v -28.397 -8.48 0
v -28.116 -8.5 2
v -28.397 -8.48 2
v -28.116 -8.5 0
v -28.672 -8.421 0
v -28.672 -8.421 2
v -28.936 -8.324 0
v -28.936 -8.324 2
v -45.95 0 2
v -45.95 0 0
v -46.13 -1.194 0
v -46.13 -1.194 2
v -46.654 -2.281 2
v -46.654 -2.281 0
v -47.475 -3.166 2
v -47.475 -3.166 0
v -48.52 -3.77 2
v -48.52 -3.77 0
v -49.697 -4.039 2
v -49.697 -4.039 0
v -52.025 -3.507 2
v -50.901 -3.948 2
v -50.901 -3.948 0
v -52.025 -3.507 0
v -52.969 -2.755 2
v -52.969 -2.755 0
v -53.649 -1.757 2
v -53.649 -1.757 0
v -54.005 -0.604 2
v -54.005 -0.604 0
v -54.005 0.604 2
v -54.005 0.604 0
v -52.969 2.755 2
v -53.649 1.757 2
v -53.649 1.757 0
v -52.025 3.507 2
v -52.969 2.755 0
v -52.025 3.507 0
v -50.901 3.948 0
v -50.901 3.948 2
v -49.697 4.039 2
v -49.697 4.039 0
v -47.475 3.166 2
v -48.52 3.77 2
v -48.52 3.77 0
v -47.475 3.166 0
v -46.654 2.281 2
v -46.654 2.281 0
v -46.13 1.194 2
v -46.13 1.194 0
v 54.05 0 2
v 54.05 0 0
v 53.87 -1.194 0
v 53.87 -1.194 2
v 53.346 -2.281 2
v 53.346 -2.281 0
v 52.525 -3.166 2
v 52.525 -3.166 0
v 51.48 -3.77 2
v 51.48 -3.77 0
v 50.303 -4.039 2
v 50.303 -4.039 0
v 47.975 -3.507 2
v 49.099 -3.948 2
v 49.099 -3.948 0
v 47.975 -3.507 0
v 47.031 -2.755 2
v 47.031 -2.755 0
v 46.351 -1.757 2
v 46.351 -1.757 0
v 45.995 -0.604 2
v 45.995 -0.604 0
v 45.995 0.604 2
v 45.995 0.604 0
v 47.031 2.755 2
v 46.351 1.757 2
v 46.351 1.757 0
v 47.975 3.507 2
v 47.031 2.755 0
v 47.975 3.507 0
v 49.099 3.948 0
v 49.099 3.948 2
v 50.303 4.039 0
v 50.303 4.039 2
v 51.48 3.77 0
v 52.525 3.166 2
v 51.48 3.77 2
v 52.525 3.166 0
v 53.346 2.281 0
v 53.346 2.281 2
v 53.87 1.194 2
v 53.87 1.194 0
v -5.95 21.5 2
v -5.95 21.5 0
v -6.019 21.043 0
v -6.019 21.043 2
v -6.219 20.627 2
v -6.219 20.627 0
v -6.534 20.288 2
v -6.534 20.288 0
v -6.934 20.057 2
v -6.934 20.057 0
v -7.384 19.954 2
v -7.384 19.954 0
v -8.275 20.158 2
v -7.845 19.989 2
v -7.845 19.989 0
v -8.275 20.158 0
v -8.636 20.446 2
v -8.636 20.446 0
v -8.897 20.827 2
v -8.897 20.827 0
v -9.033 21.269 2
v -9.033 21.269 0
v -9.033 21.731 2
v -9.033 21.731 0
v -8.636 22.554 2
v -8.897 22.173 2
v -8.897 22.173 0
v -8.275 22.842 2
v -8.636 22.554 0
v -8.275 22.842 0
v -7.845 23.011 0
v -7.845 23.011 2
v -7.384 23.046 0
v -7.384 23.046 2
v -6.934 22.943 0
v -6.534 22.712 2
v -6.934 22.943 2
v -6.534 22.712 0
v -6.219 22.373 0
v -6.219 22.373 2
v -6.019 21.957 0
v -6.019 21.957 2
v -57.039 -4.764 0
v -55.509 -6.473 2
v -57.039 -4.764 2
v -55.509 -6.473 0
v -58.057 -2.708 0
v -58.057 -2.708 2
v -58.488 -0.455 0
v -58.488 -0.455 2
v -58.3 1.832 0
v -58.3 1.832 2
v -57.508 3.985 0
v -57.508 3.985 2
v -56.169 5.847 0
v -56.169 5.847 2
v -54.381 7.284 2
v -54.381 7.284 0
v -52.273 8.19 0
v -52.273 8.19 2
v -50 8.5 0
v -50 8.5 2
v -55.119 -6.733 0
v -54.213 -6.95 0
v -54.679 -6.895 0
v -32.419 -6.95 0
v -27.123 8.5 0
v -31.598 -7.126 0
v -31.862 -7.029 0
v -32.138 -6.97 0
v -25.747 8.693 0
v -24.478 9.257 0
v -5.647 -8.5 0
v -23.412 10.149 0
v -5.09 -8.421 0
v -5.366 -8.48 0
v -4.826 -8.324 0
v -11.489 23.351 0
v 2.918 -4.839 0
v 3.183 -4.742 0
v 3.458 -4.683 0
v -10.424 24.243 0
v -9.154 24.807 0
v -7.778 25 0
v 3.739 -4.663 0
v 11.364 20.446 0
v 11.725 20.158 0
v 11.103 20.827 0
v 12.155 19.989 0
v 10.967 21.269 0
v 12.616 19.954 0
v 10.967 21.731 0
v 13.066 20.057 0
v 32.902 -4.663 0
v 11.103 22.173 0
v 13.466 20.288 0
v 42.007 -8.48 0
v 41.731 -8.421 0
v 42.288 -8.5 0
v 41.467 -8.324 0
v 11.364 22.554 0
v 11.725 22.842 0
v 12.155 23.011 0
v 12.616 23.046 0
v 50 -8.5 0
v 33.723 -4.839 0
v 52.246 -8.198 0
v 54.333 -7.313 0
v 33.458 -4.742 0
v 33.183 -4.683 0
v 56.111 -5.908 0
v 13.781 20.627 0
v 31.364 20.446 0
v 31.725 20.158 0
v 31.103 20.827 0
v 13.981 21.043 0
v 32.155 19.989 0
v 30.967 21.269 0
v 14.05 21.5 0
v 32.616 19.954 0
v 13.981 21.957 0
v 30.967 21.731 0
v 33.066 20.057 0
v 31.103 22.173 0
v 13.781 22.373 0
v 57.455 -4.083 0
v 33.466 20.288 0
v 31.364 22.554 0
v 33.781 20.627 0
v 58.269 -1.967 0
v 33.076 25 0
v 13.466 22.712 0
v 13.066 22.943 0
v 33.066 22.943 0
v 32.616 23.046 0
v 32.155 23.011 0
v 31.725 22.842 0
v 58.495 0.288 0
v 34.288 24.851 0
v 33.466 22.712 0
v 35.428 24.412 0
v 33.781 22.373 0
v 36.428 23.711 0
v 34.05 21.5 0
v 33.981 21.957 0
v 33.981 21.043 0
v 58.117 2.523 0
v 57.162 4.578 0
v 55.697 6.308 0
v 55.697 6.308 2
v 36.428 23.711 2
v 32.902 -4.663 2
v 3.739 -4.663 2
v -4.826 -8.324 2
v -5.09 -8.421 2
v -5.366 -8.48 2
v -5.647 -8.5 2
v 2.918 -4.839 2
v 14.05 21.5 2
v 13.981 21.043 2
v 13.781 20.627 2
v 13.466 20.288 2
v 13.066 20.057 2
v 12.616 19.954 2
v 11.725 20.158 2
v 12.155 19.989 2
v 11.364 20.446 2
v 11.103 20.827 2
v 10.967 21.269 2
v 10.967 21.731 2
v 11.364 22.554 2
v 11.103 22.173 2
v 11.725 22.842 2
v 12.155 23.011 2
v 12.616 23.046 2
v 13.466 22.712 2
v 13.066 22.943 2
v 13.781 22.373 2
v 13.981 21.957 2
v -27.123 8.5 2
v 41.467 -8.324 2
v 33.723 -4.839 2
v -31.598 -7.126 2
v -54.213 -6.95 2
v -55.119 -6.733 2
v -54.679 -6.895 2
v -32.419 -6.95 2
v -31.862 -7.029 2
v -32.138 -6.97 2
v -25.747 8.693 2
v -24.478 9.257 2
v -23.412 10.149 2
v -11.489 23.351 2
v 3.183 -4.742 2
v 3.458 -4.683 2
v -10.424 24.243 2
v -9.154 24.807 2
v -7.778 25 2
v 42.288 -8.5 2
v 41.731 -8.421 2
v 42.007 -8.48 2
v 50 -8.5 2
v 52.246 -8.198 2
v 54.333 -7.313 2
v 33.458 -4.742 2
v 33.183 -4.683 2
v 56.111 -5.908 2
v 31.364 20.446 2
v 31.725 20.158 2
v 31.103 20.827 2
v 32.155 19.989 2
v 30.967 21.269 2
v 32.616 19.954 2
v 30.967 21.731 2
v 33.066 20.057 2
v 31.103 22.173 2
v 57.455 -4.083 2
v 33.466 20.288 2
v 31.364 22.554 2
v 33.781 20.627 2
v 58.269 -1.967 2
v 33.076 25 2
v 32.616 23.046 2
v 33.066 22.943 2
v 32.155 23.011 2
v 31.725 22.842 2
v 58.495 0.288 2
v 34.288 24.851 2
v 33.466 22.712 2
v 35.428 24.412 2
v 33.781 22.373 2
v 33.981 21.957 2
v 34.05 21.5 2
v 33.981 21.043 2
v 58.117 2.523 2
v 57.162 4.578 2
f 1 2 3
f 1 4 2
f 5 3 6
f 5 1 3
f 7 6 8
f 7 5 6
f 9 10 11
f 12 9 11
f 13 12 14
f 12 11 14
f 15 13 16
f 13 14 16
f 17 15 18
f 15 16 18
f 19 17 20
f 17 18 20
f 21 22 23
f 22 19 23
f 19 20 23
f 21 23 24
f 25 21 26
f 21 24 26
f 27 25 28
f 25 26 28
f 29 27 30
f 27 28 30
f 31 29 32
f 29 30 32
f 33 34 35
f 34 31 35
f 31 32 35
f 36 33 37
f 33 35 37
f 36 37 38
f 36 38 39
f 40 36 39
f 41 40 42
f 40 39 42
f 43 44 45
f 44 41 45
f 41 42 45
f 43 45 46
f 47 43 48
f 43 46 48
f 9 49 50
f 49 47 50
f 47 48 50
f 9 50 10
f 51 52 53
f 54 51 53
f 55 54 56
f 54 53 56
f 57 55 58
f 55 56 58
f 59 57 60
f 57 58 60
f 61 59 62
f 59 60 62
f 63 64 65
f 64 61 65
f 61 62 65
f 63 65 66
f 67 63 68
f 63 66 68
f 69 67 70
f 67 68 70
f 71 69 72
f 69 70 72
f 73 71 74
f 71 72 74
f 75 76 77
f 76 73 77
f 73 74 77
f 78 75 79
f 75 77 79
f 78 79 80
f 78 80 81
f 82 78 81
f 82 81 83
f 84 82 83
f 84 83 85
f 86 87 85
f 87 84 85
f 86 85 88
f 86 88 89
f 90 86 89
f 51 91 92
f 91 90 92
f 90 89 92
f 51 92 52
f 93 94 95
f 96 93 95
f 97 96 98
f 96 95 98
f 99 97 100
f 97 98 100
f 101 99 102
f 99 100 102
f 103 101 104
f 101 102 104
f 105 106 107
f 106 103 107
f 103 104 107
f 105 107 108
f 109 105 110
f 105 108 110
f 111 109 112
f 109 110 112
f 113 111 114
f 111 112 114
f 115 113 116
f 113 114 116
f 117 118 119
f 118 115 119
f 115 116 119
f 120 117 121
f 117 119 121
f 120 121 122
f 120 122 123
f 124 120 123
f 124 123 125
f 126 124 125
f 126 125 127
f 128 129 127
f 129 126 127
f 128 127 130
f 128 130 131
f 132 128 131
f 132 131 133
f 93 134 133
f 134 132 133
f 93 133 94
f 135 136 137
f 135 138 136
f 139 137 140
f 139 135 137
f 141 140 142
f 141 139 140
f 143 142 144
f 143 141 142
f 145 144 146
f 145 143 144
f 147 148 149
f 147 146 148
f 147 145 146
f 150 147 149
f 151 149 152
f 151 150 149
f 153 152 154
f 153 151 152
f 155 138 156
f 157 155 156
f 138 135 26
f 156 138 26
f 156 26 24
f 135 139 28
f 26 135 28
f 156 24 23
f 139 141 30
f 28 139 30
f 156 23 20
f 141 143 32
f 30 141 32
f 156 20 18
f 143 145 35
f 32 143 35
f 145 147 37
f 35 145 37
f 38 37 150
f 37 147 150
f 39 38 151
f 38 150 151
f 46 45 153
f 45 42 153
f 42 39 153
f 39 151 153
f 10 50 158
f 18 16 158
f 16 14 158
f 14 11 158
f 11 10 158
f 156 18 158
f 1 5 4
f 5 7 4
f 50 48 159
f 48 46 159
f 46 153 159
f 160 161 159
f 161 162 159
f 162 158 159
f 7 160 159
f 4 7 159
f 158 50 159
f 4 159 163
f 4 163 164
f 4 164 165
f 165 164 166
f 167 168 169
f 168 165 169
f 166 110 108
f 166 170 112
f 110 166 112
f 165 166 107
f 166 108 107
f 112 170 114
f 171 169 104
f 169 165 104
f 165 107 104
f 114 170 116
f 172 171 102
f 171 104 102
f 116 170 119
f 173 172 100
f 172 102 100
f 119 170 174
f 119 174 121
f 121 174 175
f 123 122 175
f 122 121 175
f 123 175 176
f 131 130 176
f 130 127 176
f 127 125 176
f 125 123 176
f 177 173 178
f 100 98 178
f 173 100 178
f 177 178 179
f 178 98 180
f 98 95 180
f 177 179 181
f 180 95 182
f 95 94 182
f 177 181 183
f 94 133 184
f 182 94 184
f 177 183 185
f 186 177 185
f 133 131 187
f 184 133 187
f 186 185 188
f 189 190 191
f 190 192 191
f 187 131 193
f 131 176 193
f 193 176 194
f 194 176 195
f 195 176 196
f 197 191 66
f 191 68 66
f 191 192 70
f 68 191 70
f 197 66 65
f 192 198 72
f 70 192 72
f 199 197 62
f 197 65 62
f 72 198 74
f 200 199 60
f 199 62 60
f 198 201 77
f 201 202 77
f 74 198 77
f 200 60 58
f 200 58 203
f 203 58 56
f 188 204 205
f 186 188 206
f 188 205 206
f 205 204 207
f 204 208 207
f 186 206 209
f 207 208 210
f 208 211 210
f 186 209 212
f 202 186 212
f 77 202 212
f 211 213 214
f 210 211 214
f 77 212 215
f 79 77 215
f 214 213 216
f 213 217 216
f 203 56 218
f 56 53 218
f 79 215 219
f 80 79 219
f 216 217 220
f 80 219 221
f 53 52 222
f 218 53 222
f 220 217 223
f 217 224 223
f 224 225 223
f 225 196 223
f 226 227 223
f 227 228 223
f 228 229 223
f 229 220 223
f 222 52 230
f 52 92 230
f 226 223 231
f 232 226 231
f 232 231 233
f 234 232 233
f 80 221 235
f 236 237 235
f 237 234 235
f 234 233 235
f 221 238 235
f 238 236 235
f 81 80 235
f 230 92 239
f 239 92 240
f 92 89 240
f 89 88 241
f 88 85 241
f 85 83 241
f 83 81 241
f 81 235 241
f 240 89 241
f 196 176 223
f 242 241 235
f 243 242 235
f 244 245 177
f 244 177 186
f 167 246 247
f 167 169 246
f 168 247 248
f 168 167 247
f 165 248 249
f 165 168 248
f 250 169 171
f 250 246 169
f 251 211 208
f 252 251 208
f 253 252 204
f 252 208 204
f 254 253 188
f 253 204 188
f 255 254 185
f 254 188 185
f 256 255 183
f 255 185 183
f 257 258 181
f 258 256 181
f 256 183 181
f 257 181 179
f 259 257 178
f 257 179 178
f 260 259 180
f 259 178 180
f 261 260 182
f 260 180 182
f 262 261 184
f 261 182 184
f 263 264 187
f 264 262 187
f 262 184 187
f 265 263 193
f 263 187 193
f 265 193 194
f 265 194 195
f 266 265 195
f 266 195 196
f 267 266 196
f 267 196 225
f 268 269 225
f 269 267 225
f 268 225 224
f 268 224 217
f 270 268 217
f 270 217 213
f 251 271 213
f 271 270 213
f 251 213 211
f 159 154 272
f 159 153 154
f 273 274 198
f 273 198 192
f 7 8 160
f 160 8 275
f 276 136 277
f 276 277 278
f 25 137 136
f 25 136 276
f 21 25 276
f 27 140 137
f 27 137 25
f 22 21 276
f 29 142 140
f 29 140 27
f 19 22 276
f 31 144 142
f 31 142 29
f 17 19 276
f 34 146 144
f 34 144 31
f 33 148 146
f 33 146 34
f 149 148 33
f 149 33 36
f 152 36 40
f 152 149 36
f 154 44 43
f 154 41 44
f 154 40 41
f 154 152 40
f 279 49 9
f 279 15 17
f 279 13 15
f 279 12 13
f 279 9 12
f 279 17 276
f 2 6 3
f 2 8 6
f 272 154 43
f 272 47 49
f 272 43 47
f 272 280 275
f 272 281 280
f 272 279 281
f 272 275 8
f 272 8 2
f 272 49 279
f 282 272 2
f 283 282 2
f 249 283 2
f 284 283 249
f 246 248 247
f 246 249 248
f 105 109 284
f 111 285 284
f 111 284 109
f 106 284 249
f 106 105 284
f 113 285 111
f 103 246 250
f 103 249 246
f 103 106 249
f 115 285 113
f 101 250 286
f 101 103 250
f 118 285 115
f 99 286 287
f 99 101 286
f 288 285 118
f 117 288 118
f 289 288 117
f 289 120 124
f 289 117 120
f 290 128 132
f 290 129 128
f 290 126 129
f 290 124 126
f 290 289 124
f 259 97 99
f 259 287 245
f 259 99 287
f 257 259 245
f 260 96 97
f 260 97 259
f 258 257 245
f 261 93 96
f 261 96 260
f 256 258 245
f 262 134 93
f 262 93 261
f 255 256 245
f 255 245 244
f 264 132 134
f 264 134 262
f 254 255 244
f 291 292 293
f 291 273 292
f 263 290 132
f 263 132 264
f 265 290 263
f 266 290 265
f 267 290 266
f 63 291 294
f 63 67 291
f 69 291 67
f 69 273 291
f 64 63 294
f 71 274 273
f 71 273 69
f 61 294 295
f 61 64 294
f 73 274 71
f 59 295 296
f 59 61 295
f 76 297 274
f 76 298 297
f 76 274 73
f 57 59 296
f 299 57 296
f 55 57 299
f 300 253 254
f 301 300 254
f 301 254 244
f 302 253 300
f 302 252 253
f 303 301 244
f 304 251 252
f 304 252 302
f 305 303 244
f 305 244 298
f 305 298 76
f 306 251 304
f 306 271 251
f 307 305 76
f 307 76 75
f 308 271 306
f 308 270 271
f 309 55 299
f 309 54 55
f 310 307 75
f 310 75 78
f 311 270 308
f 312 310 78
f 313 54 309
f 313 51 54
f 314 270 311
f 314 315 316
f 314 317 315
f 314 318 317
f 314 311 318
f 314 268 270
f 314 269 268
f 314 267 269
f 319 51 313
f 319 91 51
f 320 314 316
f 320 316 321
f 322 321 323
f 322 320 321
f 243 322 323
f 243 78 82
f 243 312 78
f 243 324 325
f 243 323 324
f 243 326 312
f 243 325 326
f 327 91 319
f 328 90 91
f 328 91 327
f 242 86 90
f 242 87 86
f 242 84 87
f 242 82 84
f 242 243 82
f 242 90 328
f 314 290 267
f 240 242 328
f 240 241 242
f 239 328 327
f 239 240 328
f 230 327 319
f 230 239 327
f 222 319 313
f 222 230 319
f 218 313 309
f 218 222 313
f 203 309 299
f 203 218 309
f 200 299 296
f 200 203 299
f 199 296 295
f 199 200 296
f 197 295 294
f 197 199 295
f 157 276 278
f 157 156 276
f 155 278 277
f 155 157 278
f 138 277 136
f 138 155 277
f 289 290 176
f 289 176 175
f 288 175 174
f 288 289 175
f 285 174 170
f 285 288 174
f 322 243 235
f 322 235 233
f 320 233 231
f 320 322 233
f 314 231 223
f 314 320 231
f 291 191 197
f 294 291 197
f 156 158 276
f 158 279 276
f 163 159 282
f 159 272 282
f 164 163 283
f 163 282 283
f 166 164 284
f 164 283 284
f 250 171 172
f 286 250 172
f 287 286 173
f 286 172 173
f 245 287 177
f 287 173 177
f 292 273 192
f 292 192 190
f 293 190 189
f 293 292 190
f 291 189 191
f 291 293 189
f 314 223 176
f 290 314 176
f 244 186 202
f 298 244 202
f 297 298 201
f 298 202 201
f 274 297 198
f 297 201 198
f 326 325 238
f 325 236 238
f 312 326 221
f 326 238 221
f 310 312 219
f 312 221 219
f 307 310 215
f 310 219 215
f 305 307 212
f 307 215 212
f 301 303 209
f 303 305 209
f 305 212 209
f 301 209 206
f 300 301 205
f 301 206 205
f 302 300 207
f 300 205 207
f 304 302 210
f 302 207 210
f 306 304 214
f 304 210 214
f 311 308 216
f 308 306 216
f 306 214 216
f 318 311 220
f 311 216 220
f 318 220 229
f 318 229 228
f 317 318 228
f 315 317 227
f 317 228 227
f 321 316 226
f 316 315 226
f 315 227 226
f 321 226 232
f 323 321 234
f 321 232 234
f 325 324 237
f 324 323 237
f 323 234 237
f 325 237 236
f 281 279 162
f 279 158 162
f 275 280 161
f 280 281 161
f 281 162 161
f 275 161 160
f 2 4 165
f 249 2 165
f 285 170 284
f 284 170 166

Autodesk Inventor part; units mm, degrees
ref_plane "YZ Plane" through (0, 0, 0) normal (1, 0, 0) x (0, 1, 0)
ref_plane "XZ Plane" through (0, 0, 0) normal (0, 1, 0) x (-1, 0, 0)
ref_plane "XY Plane" through (0, 0, 0) normal (0, 0, 1) x (1, 0, 0)
sketch "スケッチ1" plane through (0, 0, 0) normal (0, 0, 1) x (1, 0, 0)
  line L0 (-50, 0) -> (50, 0) construction
  circle A0 centre (-50, 0) radius 4.05
  circle A1 centre (50, 0) radius 4.05
  line L1 (-50, 8.5) -> (50, 8.5)
  line L2 (-50, -8.5) -> (50, -8.5)
  arc A2 (-50, 8.5) -> (-50, -8.5) centre (-50, 0) ccw
  arc A3 (50, -8.5) -> (50, 8.5) centre (50, 0) ccw
  line L3 (55.697, 6.3082) -> (35, 25)
  line L4 (35, 25) -> (-10, 25)
  line L5 (-10, 25) -> (-24.9014, 8.5)
  line L6 (-16.3218, 18) -> (42.751, 18) construction
  line L7 (-10, 25) -> (-10, 18) construction
  line L8 (35, 25) -> (35, 18) construction
  circle A4 centre (32.5, 21.5) radius 1.55
  circle A5 centre (-7.5, 21.5) radius 1.55
  circle A6 centre (12.5, 21.5) radius 1.55
  line L9 (-10, 21.5) -> (35, 21.5) construction
  line L10 (35, 24) -> (-10, 24) construction
  line L11 (-10, 24) -> (-10, 19) construction
  line L12 (-10, 19) -> (35, 19) construction
  line L13 (35, 19) -> (35, 24) construction
  point P0 (0, 0)
  point P1 (0, 0)
  dimension "d0" = 100
  dimension "d1" = 8.1
  dimension "d2" = 8.5
  dimension "d8" = 8.1
  dimension "d10" = 7
  dimension "d11" = 45
  dimension "d12" = 2.5
  dimension "d13" = 3.1
  dimension "d14" = 2.5
  dimension "d15" = 15
  dimension "d17" = 5
  dimension "d18" = 19
extrude "押し出し1" add sketch "スケッチ1" along normal blind 2
fillet "フィレット1" radius 5 3 edges at (-24.9014, 8.5, 1) (-10, 25, 1) (35, 25, 1)
sketch "スケッチ2" plane through (0, 0, 2) normal (0, 0, 1) x (1, 0, 0)
  arc A0 (50, -8.5) -> (55.697, 6.3082) centre (50, 0) ccw projected
  line L0 (18, -20) -> (-35.4549, -20) construction
  line L1 (-76.9607, -11.5) -> (-72, -11.5)
  line L2 (-72, -11.5) -> (-62, -7)
  line L3 (-62, -7) -> (-32, -7)
  line L4 (-32, -7) -> (-22, -11.5)
  line L5 (-22, -11.5) -> (-17.0393, -11.5)
  line L6 (-17.0393, -11.5) -> (-17.0393, -12.4)
  line L7 (-17.0393, -12.4) -> (-76.9607, -12.4)
  line L8 (-76.9607, -12.4) -> (-76.9607, -11.5)
  line L9 (-31.9893, -6.95) -> (-62.0107, -6.95)
  line L10 (-62.0107, -6.95) -> (-72.0107, -11.45)
  line L11 (-72.0107, -11.45) -> (-77.0107, -11.45)
  line L12 (-77.0107, -11.45) -> (-77.0107, -12.45)
  line L13 (-77.0107, -12.45) -> (-16.9893, -12.45)
  line L14 (-16.9893, -12.45) -> (-16.9893, -11.45)
  line L15 (-16.9893, -11.45) -> (-21.9893, -11.45)
  line L16 (-21.9893, -11.45) -> (-31.9893, -6.95)
  circle A1 centre (-50, 0) radius 4.05 projected
  circle A2 centre (-50, 0) radius 5.5 construction
  circle A3 centre (50, 0) radius 4.05 projected
  line L17 (83.3205, -17.7128) -> (50, 0) construction
  line L18 (50, 0) -> (18, -20) construction
  line L19 (83.3205, -17.7128) -> (37.8533, -17.7128) construction
  line L20 (-11.6402, -10.1128) -> (48.2812, -10.1128)
  line L21 (48.2812, -10.1128) -> (48.2812, -9.2128)
  line L22 (48.2812, -9.2128) -> (43.3205, -9.2128)
  line L23 (43.3205, -9.2128) -> (33.3205, -4.7128)
  line L24 (33.3205, -4.7128) -> (3.3205, -4.7128)
  line L25 (3.3205, -4.7128) -> (-6.6795, -9.2128)
  line L26 (-6.6795, -9.2128) -> (-11.6402, -9.2128)
  line L27 (-11.6402, -9.2128) -> (-11.6402, -10.1128)
  line L28 (-6.6902, -9.1628) -> (3.3098, -4.6628)
  line L29 (3.3098, -4.6628) -> (33.3312, -4.6628)
  line L30 (33.3312, -4.6628) -> (43.3312, -9.1628)
  line L31 (43.3312, -9.1628) -> (48.3312, -9.1628)
  line L32 (48.3312, -9.1628) -> (48.3312, -10.1628)
  line L33 (48.3312, -10.1628) -> (-11.6902, -10.1628)
  line L34 (-11.6902, -10.1628) -> (-11.6902, -9.1628)
  line L35 (-11.6902, -9.1628) -> (-6.6902, -9.1628)
  point P0 (0, 0)
  dimension "d19" = 20
  dimension "d20" = 32
  dimension "d21" = 40
  dimension "d22" = 10
  dimension "d23" = 8.5
  dimension "d24" = 10
  dimension "d25" = 30
  dimension "d26" = 13
  dimension "d27" = 0.05
  dimension "d32" = 11
  dimension "d33" = 120
  dimension "d34" = 1
  dimension "d36" = 5
  dimension "d37" = 40
  dimension "d38" = 8.5
  dimension "d39" = 0.05
extrude "押し出し2" cut sketch "スケッチ2" against normal blind 10 contours L1 L2 L3 L4 L5 L6 L7 L8 | L16 L15 L14 L13 L12 L11 L10 L9 | L27 L26 L25 L24 L23 L22 L21 L20 | L28 L29 L30 L31 L32 L33 L34 L35
fillet "フィレット2" radius 2 7 edges at (-28.5448, -8.5, 1) (-31.9893, -6.95, 1) (-5.2173, -8.5, 1) (3.3098, -4.6628, 1) (41.8583, -8.5, 1) (33.3312, -4.6628, 1) (-54.8936, -6.95, 1)
equation "\"d8\" = d1"
equation "\"d14\" = d12"
equation "\"d24\" = d22"
equation "\"d37\" = d21"
equation "\"d38\" = d23"
properties part number "rinnku" material "GFRP"
